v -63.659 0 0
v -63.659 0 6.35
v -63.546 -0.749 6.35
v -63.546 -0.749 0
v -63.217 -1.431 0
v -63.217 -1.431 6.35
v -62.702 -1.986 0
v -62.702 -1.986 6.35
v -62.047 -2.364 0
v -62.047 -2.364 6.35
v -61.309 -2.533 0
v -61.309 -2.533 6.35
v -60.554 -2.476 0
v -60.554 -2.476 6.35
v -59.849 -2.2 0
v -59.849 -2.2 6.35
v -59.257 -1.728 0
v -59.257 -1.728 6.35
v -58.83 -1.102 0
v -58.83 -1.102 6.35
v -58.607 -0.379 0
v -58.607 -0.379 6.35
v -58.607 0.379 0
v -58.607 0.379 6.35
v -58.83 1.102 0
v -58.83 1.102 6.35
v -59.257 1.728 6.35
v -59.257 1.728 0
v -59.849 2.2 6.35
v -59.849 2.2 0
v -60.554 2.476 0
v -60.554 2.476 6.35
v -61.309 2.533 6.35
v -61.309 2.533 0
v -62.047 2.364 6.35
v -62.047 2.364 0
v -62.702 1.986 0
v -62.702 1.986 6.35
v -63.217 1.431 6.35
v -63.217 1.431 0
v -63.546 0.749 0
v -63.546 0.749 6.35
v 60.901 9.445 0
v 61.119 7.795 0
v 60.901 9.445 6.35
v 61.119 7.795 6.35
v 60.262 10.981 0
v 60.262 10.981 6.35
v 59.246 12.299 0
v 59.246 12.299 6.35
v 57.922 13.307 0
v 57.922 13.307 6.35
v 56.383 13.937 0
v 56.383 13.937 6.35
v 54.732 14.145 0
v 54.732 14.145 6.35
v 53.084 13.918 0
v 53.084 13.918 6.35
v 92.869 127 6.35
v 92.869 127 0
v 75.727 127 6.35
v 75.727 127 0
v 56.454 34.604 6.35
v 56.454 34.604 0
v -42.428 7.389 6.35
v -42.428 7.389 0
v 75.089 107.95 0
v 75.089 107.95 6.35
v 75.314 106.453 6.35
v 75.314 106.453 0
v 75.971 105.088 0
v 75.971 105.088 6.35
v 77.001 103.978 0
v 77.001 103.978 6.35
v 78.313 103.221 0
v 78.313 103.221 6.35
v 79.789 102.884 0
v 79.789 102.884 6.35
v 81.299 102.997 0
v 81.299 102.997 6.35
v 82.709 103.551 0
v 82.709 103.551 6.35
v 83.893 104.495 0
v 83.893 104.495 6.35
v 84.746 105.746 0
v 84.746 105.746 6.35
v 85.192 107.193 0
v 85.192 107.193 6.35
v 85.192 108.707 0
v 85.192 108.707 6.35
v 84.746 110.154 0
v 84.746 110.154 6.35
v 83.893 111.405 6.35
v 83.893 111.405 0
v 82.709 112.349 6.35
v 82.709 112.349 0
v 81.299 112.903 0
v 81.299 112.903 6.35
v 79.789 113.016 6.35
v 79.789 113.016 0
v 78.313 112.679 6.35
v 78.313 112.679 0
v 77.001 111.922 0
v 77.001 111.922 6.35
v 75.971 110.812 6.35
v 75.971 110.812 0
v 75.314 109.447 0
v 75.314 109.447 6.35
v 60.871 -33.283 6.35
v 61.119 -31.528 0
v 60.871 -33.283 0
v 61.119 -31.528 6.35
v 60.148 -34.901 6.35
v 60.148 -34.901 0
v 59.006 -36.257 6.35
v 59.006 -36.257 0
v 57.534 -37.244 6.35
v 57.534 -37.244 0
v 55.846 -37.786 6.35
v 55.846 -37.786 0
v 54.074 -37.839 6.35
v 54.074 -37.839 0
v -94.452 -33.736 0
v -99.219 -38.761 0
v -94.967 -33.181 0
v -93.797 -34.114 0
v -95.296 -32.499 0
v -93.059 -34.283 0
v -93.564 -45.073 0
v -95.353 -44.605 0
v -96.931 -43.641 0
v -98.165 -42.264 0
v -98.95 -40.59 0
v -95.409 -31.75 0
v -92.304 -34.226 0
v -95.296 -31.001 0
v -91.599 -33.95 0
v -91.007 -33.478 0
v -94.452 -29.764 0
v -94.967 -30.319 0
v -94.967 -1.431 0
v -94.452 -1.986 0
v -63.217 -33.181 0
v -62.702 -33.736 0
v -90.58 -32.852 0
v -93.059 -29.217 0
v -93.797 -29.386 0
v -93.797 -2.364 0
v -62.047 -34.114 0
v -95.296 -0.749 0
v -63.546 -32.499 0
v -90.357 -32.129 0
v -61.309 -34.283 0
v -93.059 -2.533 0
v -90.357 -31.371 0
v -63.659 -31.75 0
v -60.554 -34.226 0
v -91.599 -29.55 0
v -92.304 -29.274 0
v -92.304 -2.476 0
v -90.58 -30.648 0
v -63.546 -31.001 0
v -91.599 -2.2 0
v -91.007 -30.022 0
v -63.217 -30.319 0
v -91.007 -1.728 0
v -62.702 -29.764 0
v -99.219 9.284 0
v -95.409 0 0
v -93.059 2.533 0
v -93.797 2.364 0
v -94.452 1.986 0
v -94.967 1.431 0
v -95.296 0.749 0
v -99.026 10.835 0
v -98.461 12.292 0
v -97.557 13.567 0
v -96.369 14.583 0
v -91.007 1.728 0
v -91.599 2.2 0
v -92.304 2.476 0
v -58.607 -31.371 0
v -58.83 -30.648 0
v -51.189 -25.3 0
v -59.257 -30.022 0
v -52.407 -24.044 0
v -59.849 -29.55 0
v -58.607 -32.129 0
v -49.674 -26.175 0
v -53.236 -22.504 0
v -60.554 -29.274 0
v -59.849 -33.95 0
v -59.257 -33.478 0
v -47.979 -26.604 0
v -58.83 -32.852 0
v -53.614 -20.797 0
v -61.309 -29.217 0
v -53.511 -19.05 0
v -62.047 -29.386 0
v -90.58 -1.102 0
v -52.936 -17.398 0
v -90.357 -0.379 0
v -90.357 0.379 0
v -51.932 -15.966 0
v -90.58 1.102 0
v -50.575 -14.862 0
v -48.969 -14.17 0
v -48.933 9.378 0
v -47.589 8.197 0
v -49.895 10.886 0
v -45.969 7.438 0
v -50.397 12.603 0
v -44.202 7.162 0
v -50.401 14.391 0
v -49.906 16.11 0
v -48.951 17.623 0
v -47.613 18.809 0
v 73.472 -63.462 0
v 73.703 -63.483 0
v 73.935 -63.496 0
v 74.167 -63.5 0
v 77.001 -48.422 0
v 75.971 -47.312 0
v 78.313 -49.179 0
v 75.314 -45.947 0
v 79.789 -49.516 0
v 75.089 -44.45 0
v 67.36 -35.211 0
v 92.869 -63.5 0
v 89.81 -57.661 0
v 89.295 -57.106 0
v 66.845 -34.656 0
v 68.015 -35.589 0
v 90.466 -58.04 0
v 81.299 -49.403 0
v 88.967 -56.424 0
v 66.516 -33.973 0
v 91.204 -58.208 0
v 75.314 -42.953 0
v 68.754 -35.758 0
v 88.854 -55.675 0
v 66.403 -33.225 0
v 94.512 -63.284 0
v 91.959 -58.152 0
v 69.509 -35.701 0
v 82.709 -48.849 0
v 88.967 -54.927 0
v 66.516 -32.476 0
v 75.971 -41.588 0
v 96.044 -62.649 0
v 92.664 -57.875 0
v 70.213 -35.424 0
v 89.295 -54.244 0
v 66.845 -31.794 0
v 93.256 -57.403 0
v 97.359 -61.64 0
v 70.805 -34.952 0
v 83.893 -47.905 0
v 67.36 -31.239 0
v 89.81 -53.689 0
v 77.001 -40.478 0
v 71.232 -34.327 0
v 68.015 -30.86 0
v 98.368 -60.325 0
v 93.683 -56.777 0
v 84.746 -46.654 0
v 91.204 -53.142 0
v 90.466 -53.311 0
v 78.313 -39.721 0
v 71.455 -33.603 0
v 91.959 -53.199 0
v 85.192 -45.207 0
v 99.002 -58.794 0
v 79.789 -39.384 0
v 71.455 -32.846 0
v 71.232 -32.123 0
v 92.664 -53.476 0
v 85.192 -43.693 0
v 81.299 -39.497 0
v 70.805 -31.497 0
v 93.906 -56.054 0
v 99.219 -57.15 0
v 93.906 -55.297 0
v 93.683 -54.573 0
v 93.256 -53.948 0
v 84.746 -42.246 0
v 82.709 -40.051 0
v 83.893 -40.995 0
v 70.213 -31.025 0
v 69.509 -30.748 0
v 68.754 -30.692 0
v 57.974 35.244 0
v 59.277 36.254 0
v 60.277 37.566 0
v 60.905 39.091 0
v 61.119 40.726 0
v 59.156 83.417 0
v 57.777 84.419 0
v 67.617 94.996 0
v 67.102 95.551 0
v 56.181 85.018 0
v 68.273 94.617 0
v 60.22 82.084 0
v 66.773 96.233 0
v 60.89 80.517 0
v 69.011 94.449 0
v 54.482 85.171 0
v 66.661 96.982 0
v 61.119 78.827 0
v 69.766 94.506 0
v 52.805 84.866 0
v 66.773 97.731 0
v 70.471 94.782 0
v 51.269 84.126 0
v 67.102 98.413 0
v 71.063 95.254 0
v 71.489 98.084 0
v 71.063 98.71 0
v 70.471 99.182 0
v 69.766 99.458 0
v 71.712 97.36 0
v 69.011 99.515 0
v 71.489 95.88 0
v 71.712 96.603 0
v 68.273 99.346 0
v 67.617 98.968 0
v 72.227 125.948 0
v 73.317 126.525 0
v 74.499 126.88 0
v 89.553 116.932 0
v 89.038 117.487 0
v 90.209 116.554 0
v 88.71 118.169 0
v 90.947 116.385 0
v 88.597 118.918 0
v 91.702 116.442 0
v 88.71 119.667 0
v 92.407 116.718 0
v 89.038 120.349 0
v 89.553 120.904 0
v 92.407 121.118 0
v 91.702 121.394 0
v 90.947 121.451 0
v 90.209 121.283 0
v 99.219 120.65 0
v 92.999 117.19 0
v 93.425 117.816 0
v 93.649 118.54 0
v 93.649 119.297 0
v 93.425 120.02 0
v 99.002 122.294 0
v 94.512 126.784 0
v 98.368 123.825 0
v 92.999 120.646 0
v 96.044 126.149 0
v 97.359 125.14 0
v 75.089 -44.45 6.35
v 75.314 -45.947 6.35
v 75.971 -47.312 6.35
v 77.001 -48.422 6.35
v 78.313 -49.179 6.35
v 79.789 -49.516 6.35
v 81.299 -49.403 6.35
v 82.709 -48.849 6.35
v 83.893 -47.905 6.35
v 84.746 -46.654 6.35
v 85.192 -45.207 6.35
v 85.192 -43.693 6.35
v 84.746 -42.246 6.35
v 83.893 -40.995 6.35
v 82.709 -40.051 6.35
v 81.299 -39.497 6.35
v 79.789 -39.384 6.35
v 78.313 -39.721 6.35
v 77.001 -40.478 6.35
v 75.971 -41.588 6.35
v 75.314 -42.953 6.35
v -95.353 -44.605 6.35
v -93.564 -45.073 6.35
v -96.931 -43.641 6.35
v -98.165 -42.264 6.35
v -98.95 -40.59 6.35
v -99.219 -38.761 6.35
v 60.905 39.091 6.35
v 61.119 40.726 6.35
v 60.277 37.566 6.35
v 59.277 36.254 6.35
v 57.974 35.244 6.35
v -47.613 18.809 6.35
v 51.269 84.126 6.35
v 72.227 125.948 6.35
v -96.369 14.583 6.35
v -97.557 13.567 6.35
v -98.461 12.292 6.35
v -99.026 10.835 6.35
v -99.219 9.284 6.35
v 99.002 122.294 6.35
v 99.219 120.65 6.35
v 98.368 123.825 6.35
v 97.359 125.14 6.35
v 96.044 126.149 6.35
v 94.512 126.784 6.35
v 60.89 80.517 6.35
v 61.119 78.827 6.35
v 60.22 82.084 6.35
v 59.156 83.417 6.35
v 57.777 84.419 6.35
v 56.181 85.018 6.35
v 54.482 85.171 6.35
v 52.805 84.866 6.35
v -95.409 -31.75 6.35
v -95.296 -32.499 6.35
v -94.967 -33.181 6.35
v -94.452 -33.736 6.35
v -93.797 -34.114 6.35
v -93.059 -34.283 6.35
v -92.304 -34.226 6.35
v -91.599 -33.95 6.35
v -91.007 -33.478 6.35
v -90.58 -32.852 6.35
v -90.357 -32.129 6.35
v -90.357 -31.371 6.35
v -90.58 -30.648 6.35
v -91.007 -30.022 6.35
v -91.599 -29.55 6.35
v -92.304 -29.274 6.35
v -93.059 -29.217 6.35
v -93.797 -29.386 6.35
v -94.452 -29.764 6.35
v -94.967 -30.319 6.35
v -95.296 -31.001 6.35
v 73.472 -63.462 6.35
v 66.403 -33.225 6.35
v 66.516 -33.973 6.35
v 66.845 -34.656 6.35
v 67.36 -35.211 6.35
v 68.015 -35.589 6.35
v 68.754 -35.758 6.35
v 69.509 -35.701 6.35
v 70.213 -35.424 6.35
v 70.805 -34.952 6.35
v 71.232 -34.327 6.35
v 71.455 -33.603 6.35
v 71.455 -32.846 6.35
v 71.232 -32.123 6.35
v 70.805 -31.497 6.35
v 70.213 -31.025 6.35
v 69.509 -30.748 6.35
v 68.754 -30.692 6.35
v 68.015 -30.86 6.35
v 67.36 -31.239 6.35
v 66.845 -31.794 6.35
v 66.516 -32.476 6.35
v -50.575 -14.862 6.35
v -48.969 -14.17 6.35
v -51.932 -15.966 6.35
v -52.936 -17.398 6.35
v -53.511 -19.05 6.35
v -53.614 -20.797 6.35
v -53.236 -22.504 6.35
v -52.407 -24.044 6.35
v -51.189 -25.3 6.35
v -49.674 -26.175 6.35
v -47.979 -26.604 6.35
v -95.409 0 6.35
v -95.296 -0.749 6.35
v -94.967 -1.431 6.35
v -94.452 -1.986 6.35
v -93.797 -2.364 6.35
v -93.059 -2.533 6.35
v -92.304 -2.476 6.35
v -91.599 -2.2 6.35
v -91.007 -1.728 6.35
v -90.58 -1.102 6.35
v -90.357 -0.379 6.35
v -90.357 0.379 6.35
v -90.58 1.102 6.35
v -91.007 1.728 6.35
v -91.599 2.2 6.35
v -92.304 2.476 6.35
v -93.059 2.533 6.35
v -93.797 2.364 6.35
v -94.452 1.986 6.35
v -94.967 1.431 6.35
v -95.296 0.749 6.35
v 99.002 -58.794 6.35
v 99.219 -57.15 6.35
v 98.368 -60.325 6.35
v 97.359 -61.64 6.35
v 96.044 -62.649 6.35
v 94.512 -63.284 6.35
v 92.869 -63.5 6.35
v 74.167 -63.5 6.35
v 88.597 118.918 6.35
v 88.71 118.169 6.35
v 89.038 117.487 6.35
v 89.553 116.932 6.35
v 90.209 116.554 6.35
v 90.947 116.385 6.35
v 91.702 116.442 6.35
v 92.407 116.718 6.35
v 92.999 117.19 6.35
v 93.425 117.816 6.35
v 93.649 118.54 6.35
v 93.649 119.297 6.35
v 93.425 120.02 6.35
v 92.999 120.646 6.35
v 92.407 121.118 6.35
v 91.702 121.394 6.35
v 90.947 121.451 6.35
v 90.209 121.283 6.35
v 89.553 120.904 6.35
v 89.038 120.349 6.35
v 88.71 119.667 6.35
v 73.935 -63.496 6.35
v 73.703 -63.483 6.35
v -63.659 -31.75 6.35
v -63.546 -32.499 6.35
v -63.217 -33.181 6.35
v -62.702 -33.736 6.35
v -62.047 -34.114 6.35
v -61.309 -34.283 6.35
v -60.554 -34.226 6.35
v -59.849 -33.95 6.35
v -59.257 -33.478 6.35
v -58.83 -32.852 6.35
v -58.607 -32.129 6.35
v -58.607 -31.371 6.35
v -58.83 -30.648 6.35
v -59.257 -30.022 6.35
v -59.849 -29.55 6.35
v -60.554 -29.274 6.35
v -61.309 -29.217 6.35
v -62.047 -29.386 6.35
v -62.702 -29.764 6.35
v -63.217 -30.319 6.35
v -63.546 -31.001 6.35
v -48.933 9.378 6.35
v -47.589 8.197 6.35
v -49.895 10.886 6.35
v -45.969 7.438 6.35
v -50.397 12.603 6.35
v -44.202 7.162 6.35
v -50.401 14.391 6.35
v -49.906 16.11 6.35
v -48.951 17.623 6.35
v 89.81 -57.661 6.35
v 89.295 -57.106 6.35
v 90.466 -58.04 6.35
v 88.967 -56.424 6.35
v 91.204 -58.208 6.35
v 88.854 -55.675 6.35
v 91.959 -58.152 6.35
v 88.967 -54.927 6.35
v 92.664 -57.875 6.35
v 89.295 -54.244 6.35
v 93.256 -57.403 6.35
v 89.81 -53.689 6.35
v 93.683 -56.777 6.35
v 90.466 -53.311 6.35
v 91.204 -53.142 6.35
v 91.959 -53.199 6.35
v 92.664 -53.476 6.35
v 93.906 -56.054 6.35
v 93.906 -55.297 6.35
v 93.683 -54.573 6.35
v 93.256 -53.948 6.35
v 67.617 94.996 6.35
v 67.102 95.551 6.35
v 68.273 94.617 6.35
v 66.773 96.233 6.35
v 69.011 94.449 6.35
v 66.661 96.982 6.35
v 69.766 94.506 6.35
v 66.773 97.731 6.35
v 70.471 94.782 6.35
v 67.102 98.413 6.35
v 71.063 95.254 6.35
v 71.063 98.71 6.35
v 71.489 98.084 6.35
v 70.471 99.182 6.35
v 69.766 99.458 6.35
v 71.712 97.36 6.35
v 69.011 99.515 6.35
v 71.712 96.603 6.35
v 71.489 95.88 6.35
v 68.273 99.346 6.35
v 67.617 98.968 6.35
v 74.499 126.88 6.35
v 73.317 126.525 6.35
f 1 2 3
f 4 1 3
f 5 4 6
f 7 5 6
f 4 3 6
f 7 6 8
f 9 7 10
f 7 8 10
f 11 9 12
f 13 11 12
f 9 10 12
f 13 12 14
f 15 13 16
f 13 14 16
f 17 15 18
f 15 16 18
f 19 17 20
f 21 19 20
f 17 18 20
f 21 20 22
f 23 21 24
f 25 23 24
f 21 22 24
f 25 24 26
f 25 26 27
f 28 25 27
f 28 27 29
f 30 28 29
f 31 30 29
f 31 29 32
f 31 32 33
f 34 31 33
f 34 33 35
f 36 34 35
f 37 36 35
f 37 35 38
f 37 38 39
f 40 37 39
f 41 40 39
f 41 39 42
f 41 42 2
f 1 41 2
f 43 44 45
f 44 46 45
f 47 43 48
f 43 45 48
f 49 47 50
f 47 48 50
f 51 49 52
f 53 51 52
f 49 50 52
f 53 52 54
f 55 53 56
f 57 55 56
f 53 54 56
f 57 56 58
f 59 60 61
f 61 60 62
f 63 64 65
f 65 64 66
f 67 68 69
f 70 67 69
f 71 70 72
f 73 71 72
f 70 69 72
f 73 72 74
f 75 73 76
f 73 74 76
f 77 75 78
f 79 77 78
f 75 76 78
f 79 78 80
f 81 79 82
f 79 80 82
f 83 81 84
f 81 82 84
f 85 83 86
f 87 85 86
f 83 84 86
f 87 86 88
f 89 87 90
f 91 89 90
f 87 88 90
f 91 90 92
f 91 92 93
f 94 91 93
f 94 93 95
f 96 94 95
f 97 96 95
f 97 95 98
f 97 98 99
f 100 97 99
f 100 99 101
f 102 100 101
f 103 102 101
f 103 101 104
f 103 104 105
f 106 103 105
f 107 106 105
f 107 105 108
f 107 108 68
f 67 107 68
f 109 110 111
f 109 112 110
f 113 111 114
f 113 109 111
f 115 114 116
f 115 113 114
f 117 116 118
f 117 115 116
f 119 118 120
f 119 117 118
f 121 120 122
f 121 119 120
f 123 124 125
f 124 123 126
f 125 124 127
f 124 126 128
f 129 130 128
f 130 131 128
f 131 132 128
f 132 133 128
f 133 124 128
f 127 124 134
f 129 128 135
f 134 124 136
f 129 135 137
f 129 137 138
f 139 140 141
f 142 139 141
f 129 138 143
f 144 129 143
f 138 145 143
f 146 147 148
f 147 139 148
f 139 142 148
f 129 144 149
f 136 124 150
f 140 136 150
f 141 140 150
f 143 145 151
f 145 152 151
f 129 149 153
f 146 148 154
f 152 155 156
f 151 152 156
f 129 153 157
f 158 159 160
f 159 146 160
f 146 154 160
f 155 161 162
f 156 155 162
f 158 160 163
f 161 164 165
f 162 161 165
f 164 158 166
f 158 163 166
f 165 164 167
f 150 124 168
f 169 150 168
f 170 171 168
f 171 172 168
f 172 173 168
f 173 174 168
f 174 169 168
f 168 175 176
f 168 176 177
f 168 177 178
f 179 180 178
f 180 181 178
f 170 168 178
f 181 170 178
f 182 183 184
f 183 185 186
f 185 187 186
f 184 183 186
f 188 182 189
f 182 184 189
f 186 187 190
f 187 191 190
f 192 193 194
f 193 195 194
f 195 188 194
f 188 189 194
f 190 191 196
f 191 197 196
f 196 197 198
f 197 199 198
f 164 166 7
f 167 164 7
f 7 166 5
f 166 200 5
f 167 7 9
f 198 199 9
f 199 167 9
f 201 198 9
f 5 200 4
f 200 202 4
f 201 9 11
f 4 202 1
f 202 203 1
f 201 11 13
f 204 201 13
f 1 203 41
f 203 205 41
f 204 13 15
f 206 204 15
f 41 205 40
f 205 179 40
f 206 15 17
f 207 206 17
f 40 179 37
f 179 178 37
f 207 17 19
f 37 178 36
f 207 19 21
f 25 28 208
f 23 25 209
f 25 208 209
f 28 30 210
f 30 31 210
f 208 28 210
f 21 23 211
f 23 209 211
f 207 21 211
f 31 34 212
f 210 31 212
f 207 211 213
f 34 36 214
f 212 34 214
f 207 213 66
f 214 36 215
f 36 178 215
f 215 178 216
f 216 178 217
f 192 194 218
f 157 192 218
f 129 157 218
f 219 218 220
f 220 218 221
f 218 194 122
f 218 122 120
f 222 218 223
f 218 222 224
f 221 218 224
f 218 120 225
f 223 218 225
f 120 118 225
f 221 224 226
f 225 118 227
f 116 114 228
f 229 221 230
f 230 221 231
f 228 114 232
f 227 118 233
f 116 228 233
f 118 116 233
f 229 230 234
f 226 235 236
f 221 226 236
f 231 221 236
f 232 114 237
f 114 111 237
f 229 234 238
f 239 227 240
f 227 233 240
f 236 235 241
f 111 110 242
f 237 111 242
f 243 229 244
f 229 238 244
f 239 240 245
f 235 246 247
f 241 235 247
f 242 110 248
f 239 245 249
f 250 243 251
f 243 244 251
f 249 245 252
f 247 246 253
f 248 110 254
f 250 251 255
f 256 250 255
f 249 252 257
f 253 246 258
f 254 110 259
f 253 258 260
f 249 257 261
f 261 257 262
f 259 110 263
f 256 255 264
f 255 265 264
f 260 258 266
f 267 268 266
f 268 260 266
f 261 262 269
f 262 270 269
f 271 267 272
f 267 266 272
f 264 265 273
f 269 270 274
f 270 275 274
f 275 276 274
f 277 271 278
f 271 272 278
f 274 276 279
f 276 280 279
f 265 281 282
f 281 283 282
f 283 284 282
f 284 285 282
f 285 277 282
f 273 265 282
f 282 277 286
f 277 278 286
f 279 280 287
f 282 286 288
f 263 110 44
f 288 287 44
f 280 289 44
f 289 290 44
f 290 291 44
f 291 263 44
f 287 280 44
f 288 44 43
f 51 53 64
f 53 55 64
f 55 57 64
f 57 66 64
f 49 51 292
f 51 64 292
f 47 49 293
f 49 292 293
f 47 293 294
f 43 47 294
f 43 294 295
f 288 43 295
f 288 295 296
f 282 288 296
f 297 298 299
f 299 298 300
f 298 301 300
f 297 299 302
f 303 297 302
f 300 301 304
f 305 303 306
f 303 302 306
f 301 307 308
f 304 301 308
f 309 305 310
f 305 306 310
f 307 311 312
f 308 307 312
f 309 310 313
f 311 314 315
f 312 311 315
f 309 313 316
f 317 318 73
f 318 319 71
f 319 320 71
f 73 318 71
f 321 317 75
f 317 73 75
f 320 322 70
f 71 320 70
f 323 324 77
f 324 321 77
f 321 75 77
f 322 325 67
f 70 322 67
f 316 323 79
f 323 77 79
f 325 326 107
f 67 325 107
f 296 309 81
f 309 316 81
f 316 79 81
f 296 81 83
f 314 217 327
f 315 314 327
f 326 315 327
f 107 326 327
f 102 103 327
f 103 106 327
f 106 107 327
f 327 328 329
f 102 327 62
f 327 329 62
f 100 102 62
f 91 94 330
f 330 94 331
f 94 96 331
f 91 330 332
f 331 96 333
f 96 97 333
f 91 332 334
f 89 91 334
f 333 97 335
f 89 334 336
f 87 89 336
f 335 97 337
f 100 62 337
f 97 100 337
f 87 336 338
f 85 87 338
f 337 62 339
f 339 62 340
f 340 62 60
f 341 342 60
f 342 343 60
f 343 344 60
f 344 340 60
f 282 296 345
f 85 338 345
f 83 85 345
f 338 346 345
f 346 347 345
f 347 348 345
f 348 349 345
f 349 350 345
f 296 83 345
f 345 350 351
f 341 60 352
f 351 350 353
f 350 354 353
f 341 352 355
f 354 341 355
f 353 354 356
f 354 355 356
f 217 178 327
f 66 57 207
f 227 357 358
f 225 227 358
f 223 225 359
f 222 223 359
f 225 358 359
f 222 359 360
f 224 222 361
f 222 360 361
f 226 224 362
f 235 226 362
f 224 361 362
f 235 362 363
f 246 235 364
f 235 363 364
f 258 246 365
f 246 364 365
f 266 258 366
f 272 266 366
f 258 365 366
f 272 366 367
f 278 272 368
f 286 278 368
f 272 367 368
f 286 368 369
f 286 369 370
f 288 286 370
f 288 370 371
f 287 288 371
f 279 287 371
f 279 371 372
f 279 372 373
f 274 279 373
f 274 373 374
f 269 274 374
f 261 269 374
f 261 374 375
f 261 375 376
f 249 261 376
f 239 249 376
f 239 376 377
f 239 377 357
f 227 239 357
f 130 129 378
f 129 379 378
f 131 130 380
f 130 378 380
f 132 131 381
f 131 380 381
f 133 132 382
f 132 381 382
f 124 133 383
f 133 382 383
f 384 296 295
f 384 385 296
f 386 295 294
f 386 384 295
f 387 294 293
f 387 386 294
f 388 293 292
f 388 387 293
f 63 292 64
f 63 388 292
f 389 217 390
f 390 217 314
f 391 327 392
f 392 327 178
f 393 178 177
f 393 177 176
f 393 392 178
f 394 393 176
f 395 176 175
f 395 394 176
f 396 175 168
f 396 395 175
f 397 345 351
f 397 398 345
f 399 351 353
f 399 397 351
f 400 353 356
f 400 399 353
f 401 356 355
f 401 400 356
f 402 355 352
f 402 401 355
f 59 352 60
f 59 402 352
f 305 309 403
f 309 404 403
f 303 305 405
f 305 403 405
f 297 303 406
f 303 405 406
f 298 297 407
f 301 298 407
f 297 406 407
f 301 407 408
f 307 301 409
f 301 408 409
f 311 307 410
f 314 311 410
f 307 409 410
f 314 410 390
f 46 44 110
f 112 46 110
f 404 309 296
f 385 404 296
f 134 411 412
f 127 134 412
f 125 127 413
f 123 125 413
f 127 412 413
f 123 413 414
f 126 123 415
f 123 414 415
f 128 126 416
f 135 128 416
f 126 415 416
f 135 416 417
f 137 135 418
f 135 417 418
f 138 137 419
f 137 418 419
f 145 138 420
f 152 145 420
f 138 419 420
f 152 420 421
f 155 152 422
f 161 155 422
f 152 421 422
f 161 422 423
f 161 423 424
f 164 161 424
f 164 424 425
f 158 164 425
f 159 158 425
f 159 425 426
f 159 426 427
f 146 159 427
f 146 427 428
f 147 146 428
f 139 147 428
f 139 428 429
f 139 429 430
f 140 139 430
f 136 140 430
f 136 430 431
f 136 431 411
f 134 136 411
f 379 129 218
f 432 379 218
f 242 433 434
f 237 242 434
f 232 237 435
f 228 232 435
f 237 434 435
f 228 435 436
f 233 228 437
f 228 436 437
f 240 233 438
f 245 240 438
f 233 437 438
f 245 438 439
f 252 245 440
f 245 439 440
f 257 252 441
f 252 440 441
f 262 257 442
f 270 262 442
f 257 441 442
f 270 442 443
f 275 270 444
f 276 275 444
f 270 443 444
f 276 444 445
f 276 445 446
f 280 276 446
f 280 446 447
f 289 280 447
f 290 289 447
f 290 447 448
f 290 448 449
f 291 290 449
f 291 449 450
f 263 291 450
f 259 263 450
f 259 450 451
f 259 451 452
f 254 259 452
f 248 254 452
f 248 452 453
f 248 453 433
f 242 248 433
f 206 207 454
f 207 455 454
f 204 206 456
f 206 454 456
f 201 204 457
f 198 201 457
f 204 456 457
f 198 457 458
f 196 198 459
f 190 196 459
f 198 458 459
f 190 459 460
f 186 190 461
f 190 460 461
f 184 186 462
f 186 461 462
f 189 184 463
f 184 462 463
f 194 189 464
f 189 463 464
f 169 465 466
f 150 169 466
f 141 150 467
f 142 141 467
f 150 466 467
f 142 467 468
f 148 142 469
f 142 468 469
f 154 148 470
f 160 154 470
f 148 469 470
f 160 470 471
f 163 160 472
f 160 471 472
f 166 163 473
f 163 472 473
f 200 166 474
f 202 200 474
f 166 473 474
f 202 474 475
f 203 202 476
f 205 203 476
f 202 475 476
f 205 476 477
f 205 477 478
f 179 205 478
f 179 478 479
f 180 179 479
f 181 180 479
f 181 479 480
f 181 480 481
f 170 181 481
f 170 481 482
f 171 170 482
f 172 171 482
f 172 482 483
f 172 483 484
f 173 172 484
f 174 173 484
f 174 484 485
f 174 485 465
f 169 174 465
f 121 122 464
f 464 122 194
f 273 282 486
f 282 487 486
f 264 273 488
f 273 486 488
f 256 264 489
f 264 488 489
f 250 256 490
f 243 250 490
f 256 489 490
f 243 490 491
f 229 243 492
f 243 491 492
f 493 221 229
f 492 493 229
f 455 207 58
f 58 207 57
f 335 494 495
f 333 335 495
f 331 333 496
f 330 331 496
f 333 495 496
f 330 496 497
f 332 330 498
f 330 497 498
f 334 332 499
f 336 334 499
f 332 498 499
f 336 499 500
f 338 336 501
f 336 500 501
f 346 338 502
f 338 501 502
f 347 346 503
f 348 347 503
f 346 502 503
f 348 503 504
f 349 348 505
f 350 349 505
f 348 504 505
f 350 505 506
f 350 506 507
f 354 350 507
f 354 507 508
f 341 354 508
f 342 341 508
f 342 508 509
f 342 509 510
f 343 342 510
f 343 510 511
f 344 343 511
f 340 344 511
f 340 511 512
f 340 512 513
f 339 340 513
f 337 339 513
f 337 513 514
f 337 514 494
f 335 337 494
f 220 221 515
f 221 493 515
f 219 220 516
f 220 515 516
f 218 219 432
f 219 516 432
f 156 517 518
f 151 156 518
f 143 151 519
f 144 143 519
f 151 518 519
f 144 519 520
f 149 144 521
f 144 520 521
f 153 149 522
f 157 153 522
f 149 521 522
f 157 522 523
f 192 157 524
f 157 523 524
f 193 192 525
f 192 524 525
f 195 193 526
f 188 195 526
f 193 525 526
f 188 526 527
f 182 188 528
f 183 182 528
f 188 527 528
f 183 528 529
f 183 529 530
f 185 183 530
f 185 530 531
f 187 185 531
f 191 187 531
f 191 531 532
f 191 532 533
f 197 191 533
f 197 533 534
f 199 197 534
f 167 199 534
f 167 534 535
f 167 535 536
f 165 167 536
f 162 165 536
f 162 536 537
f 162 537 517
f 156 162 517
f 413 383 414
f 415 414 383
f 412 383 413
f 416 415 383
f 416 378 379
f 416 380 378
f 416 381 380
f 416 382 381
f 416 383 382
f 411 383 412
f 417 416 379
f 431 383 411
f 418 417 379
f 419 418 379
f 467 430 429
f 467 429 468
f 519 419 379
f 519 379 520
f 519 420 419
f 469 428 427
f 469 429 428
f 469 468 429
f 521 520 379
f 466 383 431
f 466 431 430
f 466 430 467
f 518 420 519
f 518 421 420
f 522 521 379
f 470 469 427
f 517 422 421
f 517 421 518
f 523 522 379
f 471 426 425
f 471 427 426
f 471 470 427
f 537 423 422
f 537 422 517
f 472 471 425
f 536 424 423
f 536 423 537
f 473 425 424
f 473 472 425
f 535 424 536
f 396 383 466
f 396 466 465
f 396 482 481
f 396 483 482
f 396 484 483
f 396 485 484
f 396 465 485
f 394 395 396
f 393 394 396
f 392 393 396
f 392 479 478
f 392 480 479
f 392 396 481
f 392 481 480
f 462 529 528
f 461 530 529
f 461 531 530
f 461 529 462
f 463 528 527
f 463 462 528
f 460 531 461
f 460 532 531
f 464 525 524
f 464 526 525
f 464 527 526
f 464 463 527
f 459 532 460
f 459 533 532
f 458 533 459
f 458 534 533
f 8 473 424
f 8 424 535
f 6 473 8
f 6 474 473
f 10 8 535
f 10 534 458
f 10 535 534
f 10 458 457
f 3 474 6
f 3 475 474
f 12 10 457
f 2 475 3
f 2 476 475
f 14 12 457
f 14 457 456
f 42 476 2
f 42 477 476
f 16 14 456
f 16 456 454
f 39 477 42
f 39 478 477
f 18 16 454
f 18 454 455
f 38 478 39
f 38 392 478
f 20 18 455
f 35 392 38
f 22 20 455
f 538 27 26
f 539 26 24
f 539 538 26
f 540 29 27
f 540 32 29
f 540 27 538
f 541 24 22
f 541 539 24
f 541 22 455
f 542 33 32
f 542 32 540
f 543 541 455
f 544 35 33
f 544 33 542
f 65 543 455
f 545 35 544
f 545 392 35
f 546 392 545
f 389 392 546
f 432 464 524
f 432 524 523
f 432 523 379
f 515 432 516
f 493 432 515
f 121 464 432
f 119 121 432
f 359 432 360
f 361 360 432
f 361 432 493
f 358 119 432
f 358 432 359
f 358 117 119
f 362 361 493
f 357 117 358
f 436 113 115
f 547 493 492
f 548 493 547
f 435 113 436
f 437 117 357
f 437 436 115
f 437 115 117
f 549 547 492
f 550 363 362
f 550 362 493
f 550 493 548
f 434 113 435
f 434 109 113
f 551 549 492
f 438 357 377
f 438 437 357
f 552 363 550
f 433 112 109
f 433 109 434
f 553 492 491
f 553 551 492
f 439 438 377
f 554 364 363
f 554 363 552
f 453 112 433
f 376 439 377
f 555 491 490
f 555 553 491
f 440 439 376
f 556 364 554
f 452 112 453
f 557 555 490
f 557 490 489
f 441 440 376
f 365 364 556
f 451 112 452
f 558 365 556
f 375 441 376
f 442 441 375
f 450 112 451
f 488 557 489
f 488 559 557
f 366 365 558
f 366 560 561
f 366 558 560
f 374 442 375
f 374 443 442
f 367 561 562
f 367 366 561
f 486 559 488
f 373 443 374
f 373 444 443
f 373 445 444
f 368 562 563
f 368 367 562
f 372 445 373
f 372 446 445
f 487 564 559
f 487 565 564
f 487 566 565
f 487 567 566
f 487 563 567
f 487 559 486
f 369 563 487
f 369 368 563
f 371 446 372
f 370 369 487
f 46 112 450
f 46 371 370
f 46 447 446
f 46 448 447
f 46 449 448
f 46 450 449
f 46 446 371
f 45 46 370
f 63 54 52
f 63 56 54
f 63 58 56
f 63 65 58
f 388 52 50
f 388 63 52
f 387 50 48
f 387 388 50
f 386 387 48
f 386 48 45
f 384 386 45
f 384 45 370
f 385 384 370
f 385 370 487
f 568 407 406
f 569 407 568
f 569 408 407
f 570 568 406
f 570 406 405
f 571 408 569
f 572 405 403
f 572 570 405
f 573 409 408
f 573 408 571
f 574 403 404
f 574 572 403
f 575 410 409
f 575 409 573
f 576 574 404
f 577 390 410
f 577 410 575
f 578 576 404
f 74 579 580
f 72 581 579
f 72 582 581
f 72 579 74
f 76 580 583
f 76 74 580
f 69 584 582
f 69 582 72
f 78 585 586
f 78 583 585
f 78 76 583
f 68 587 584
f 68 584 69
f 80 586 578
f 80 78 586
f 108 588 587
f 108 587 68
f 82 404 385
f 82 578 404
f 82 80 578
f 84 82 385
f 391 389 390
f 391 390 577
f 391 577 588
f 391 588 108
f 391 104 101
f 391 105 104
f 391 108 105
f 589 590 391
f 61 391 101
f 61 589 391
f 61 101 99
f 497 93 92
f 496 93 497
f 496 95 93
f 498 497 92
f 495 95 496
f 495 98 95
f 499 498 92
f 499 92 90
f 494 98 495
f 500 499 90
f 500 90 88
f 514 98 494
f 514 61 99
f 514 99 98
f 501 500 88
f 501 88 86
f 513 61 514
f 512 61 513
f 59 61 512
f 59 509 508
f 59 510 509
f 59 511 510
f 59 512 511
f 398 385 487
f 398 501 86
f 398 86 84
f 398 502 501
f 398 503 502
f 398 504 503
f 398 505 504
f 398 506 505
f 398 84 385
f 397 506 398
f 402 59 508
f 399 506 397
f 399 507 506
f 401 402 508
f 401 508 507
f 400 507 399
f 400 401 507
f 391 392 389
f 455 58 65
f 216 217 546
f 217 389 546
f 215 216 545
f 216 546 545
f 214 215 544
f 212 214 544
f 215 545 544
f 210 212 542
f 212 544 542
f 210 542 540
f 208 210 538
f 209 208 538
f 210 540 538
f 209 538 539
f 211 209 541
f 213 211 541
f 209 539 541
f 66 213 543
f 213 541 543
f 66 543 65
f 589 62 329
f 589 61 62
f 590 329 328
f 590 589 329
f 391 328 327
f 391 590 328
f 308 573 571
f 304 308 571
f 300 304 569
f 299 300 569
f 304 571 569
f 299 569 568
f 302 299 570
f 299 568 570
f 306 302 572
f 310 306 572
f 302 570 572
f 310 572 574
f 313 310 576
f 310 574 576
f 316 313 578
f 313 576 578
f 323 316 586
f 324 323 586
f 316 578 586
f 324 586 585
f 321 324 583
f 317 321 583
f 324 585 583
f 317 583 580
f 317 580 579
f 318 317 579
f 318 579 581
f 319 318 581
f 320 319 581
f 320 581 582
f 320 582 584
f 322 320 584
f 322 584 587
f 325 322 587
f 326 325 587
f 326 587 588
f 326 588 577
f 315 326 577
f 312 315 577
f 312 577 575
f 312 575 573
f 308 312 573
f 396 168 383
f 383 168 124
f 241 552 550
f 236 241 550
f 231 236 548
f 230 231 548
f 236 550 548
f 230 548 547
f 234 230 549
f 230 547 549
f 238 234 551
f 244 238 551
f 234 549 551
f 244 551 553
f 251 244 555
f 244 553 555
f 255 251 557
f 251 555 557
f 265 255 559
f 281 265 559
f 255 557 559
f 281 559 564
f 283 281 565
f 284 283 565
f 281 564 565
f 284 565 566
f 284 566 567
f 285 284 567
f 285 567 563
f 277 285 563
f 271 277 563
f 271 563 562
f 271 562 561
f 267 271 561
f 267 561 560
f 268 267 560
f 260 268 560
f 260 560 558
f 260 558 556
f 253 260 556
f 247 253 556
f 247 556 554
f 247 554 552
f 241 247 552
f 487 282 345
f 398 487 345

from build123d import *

# Parameters (mm, degrees)
F1_DEPTH = 6.35
F2_R     = 6.35
F3_D     = 10.16
F4_D     = 5.08


with BuildPart() as f1:
    # F0 (on Top) → F1 (new body)
    with BuildSketch(Plane.XY):
        Polygon((99.21875, -63.5), (99.21875, 127), (73.81875, 127), (-99.21875, 12.7), (-99.21875, -15.2791400352), (-99.21875, -20.9632049465), (-99.21875, -44.45), (73.81875, -63.5), align=None)
        Polygon((61.11875, -38.6150398089), (-80.955676291, -22.9738185659), (61.11875, 16.1292345417), align=None, mode=Mode.SUBTRACT)
        Polygon((61.11875, 35.8875947884), (-80.955676291, -3.2154583192), (61.11875, 90.6318691391), align=None, mode=Mode.SUBTRACT)
    extrude(amount=F1_DEPTH)

    # F2
    f2_edges = [f1.edges().sort_by_distance(p)[0] for p in [
        (99.21875, -63.5, 3.175),
        (99.21875, 127, 3.175),
        (-80.955676, -3.215458, 3.175),
        (-80.955676, -22.973819, 3.175),
        (61.11875, 90.631869, 3.175),
        (61.11875, 16.129235, 3.175),
        (61.11875, -38.61504, 3.175),
        (61.11875, 35.887595, 3.175),
        (-99.21875, -44.45, 3.175),
        (73.81875, -63.5, 3.175),
        (73.81875, 127, 3.175),
        (-99.21875, 12.7, 3.175),
    ]]
    fillet(f2_edges, radius=F2_R)

    # F3 (through all)
    with Locations(Plane(origin=(0, 0, 0), x_dir=(1, 0, 0), z_dir=(0, 0, -1))):
        with Locations((80.16875, -107.95), (80.16875, 44.45)):
            Hole(F3_D / 2)

    # F4 (through all)
    with Locations(Plane(origin=(0, 0, 0), x_dir=(1, 0, 0), z_dir=(0, 0, -1))):
        with Locations((91.1368808609, -118.9181308609), (69.2006191391, -96.9818691391), (91.3940701513, 55.6753201513), (68.9434298487, 33.2246798487), (-61.11875, 31.75), (-92.86875, 0), (-61.11875, 0), (-92.86875, 31.75)):
            Hole(F4_D / 2)


solid = f1.part
